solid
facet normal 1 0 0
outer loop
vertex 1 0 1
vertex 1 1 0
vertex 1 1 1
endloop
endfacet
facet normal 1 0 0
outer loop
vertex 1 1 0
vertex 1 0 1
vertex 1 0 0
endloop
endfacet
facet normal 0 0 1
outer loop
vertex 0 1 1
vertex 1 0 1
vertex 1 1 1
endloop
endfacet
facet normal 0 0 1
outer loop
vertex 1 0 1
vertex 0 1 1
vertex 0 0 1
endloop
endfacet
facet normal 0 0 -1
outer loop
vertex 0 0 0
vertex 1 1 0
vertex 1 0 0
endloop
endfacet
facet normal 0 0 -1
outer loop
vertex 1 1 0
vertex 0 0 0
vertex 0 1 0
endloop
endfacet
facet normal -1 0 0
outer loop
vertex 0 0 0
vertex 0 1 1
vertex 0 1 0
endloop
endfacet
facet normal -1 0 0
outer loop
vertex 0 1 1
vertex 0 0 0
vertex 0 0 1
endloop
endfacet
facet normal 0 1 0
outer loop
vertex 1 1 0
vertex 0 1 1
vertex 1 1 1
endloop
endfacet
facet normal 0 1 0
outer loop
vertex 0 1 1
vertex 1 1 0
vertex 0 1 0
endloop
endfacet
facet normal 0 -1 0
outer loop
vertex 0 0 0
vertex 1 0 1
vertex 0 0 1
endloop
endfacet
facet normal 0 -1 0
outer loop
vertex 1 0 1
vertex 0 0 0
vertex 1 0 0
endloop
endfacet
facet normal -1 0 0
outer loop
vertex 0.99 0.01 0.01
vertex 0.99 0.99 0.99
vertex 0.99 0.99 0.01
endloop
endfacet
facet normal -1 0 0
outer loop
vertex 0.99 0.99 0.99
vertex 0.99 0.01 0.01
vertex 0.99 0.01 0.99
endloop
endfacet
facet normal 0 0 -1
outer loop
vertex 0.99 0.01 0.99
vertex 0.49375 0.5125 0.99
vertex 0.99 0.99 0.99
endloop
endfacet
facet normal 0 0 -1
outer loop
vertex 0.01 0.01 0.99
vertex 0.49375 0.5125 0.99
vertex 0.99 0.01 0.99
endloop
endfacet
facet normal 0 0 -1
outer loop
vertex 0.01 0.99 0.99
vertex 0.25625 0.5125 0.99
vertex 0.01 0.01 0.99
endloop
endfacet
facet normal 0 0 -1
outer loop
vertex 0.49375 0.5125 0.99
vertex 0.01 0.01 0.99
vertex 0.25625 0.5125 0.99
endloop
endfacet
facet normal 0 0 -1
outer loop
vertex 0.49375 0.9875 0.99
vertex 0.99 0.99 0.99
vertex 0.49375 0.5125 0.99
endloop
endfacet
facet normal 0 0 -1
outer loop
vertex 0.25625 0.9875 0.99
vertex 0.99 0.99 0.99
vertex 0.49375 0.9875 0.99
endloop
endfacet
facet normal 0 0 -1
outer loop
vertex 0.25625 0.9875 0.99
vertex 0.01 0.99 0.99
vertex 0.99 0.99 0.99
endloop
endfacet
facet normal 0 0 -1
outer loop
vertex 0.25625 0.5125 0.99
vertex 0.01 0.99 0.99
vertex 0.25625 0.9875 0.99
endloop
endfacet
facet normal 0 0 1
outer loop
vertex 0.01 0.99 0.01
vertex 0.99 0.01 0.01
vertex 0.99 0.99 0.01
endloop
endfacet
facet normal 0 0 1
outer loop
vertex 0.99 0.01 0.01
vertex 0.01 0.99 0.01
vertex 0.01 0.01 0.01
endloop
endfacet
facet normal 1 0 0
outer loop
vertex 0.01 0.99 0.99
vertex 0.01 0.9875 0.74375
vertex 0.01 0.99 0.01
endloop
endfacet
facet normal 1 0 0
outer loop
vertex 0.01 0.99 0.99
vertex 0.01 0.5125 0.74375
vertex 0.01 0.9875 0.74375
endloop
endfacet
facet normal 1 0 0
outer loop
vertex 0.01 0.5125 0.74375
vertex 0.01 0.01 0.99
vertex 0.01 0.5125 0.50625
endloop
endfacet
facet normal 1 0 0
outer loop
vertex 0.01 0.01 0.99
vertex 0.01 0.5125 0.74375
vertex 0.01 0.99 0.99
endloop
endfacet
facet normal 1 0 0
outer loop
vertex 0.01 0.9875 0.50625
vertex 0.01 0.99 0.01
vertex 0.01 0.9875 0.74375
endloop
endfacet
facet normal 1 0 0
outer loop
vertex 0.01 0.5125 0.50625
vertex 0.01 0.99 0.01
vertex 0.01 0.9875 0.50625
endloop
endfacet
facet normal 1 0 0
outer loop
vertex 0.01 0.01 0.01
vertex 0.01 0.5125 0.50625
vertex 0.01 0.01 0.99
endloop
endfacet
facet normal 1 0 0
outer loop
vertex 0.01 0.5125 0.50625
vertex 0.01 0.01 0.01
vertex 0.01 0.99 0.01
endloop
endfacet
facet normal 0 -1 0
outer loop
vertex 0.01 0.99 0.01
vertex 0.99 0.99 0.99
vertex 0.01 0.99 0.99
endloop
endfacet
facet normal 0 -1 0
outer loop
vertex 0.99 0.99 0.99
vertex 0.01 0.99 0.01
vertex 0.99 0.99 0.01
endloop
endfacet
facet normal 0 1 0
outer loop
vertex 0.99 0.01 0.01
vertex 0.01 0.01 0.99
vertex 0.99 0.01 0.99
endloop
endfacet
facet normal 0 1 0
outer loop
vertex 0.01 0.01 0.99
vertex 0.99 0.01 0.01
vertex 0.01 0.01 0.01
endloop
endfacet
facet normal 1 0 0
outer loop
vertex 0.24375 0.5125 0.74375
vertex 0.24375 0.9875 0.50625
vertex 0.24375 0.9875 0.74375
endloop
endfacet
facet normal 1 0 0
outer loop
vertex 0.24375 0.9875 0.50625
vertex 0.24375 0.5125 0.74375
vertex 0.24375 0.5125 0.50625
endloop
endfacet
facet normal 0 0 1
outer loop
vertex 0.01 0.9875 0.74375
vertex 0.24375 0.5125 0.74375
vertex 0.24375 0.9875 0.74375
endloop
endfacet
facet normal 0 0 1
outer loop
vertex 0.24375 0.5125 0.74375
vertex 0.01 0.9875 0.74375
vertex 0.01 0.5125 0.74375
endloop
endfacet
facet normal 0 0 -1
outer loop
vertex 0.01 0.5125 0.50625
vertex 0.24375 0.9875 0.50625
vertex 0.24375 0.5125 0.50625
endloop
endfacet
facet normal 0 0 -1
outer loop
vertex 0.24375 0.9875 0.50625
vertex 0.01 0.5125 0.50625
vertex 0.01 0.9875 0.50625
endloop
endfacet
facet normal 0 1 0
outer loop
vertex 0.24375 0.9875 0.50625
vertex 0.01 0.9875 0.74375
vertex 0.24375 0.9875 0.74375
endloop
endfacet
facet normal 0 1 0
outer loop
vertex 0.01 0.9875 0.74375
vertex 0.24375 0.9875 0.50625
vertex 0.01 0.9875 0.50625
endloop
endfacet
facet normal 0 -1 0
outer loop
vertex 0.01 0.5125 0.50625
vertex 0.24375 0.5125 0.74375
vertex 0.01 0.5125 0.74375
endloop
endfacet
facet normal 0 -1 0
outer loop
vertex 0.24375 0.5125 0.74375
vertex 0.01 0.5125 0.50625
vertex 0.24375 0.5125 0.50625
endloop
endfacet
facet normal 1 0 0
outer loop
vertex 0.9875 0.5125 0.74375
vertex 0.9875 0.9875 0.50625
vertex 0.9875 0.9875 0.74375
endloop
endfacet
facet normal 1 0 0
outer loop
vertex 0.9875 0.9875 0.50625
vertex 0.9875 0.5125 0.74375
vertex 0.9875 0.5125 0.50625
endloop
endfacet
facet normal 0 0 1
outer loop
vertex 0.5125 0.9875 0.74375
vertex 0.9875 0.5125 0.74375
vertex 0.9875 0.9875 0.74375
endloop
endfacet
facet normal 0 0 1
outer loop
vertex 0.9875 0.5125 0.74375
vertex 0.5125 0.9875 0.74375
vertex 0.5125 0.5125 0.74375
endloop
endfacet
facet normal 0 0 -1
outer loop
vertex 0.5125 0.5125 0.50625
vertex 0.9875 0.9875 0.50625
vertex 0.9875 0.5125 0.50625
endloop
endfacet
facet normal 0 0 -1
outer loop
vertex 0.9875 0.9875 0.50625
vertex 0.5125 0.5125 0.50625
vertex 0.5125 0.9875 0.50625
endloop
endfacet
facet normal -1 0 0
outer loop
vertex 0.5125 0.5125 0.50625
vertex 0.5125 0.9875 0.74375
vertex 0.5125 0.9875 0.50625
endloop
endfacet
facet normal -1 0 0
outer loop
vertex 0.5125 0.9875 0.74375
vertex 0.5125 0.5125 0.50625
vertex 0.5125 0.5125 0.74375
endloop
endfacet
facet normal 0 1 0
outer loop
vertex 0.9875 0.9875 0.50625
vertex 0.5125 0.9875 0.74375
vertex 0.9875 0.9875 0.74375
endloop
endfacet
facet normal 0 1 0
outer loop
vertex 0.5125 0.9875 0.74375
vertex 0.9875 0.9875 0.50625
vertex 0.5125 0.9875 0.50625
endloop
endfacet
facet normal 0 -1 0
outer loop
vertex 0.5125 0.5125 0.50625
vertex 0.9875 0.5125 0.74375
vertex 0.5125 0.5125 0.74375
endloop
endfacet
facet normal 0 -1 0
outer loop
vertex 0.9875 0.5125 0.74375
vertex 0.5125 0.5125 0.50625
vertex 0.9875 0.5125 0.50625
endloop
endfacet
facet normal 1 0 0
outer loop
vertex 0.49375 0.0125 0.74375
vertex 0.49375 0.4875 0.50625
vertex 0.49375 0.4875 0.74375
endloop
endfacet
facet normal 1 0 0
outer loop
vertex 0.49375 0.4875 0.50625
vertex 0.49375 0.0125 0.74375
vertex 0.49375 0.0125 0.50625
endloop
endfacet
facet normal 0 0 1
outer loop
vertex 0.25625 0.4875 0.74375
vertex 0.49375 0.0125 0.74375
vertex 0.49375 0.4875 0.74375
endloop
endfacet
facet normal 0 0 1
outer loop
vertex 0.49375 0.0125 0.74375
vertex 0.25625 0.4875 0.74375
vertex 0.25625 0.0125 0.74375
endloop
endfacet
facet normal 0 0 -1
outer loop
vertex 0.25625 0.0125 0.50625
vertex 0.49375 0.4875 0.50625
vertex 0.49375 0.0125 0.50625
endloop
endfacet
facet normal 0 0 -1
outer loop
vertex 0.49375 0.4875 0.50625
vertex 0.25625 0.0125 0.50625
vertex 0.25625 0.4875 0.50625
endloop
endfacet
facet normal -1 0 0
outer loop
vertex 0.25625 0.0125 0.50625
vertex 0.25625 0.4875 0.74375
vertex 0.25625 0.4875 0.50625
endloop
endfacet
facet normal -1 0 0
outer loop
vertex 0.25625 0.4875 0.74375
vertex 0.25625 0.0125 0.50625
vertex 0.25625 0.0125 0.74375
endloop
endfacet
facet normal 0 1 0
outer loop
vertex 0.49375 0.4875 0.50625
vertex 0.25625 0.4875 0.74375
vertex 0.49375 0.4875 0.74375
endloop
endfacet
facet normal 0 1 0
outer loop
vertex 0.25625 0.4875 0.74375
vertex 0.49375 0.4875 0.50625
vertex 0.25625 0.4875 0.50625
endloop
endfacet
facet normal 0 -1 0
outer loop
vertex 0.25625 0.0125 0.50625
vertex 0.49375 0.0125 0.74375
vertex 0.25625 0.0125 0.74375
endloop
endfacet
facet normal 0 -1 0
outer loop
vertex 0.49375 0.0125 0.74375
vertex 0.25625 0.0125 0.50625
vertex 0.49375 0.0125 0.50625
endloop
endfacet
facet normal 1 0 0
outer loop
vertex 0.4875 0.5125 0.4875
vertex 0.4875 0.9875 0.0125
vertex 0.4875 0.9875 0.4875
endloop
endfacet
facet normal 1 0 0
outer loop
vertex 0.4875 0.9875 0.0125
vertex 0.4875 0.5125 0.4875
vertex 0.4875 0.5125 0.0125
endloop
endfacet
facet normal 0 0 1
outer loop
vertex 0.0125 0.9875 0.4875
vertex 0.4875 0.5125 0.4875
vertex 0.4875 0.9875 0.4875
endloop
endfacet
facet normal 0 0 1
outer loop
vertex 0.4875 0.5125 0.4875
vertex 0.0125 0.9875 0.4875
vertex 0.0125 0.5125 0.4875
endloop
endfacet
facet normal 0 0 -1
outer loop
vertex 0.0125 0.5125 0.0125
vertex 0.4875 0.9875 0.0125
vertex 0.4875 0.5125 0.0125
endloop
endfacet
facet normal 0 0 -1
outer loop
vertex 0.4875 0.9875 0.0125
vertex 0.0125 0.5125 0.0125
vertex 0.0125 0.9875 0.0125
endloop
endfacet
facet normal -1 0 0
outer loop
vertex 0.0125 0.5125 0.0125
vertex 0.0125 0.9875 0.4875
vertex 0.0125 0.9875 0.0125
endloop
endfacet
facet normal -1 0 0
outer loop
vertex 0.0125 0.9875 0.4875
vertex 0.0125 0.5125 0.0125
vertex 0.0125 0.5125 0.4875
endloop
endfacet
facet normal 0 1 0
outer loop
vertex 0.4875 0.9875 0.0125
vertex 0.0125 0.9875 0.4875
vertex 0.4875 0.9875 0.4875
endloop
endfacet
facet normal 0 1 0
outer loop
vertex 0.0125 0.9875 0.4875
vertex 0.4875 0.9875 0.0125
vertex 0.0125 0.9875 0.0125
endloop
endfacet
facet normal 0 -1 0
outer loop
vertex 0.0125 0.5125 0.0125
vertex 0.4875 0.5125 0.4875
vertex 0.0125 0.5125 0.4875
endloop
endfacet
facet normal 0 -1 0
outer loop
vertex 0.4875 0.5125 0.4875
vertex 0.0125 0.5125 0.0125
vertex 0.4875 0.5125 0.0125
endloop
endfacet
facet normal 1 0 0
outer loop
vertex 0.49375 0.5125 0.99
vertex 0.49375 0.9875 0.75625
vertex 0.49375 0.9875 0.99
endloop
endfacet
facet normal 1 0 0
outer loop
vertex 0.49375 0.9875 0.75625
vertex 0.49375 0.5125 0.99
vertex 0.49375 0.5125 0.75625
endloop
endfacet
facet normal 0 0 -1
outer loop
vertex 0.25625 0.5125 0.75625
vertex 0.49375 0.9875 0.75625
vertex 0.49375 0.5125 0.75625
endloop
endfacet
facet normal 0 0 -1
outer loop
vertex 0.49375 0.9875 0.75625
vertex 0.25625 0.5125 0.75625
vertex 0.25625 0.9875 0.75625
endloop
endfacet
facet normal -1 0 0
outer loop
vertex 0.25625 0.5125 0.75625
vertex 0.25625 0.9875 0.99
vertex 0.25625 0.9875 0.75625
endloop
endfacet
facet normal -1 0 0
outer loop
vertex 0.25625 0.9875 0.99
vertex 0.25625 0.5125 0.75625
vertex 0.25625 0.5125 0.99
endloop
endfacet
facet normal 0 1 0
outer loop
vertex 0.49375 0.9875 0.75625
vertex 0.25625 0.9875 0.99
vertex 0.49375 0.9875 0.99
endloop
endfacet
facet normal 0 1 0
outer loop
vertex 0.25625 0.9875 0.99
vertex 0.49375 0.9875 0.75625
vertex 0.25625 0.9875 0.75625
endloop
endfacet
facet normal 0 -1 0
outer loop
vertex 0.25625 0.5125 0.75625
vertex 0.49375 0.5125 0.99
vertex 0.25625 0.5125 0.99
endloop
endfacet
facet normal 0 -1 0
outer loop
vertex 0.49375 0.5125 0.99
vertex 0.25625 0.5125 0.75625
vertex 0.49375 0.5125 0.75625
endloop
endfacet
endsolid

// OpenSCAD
translate([0.125, 0.75, 0.625]) color([0.4476031180289046, 0.16092623262395112, 0.5490446113012659]) cube([0.2375, 0.475, 0.2375], center=true);
translate([0.75, 0.75, 0.625]) color([0.5238541341212296, 0.43791302636404483, 0.31093574855308515]) cube([0.475, 0.475, 0.2375], center=true);
translate([0.375, 0.25, 0.625]) color([0.021000853231791017, 0.9173252836960585, 0.17273941339049093]) cube([0.2375, 0.475, 0.2375], center=true);
translate([0.25, 0.75, 0.25]) color([0.8119685420560828, 0.5544206155784966, 0.7059921475581654]) cube([0.475, 0.475, 0.475], center=true);
translate([0.375, 0.75, 0.875]) color([0.6515959308990943, 0.1711768401247621, 0.5427157127593492]) cube([0.2375, 0.475, 0.2375], center=true);
color([0.3,0.3,0.3,0.3]) difference() { cube([1,1,1]); translate([0.01,0.01,0.01]) cube([0.98,0.98,0.98]); }
